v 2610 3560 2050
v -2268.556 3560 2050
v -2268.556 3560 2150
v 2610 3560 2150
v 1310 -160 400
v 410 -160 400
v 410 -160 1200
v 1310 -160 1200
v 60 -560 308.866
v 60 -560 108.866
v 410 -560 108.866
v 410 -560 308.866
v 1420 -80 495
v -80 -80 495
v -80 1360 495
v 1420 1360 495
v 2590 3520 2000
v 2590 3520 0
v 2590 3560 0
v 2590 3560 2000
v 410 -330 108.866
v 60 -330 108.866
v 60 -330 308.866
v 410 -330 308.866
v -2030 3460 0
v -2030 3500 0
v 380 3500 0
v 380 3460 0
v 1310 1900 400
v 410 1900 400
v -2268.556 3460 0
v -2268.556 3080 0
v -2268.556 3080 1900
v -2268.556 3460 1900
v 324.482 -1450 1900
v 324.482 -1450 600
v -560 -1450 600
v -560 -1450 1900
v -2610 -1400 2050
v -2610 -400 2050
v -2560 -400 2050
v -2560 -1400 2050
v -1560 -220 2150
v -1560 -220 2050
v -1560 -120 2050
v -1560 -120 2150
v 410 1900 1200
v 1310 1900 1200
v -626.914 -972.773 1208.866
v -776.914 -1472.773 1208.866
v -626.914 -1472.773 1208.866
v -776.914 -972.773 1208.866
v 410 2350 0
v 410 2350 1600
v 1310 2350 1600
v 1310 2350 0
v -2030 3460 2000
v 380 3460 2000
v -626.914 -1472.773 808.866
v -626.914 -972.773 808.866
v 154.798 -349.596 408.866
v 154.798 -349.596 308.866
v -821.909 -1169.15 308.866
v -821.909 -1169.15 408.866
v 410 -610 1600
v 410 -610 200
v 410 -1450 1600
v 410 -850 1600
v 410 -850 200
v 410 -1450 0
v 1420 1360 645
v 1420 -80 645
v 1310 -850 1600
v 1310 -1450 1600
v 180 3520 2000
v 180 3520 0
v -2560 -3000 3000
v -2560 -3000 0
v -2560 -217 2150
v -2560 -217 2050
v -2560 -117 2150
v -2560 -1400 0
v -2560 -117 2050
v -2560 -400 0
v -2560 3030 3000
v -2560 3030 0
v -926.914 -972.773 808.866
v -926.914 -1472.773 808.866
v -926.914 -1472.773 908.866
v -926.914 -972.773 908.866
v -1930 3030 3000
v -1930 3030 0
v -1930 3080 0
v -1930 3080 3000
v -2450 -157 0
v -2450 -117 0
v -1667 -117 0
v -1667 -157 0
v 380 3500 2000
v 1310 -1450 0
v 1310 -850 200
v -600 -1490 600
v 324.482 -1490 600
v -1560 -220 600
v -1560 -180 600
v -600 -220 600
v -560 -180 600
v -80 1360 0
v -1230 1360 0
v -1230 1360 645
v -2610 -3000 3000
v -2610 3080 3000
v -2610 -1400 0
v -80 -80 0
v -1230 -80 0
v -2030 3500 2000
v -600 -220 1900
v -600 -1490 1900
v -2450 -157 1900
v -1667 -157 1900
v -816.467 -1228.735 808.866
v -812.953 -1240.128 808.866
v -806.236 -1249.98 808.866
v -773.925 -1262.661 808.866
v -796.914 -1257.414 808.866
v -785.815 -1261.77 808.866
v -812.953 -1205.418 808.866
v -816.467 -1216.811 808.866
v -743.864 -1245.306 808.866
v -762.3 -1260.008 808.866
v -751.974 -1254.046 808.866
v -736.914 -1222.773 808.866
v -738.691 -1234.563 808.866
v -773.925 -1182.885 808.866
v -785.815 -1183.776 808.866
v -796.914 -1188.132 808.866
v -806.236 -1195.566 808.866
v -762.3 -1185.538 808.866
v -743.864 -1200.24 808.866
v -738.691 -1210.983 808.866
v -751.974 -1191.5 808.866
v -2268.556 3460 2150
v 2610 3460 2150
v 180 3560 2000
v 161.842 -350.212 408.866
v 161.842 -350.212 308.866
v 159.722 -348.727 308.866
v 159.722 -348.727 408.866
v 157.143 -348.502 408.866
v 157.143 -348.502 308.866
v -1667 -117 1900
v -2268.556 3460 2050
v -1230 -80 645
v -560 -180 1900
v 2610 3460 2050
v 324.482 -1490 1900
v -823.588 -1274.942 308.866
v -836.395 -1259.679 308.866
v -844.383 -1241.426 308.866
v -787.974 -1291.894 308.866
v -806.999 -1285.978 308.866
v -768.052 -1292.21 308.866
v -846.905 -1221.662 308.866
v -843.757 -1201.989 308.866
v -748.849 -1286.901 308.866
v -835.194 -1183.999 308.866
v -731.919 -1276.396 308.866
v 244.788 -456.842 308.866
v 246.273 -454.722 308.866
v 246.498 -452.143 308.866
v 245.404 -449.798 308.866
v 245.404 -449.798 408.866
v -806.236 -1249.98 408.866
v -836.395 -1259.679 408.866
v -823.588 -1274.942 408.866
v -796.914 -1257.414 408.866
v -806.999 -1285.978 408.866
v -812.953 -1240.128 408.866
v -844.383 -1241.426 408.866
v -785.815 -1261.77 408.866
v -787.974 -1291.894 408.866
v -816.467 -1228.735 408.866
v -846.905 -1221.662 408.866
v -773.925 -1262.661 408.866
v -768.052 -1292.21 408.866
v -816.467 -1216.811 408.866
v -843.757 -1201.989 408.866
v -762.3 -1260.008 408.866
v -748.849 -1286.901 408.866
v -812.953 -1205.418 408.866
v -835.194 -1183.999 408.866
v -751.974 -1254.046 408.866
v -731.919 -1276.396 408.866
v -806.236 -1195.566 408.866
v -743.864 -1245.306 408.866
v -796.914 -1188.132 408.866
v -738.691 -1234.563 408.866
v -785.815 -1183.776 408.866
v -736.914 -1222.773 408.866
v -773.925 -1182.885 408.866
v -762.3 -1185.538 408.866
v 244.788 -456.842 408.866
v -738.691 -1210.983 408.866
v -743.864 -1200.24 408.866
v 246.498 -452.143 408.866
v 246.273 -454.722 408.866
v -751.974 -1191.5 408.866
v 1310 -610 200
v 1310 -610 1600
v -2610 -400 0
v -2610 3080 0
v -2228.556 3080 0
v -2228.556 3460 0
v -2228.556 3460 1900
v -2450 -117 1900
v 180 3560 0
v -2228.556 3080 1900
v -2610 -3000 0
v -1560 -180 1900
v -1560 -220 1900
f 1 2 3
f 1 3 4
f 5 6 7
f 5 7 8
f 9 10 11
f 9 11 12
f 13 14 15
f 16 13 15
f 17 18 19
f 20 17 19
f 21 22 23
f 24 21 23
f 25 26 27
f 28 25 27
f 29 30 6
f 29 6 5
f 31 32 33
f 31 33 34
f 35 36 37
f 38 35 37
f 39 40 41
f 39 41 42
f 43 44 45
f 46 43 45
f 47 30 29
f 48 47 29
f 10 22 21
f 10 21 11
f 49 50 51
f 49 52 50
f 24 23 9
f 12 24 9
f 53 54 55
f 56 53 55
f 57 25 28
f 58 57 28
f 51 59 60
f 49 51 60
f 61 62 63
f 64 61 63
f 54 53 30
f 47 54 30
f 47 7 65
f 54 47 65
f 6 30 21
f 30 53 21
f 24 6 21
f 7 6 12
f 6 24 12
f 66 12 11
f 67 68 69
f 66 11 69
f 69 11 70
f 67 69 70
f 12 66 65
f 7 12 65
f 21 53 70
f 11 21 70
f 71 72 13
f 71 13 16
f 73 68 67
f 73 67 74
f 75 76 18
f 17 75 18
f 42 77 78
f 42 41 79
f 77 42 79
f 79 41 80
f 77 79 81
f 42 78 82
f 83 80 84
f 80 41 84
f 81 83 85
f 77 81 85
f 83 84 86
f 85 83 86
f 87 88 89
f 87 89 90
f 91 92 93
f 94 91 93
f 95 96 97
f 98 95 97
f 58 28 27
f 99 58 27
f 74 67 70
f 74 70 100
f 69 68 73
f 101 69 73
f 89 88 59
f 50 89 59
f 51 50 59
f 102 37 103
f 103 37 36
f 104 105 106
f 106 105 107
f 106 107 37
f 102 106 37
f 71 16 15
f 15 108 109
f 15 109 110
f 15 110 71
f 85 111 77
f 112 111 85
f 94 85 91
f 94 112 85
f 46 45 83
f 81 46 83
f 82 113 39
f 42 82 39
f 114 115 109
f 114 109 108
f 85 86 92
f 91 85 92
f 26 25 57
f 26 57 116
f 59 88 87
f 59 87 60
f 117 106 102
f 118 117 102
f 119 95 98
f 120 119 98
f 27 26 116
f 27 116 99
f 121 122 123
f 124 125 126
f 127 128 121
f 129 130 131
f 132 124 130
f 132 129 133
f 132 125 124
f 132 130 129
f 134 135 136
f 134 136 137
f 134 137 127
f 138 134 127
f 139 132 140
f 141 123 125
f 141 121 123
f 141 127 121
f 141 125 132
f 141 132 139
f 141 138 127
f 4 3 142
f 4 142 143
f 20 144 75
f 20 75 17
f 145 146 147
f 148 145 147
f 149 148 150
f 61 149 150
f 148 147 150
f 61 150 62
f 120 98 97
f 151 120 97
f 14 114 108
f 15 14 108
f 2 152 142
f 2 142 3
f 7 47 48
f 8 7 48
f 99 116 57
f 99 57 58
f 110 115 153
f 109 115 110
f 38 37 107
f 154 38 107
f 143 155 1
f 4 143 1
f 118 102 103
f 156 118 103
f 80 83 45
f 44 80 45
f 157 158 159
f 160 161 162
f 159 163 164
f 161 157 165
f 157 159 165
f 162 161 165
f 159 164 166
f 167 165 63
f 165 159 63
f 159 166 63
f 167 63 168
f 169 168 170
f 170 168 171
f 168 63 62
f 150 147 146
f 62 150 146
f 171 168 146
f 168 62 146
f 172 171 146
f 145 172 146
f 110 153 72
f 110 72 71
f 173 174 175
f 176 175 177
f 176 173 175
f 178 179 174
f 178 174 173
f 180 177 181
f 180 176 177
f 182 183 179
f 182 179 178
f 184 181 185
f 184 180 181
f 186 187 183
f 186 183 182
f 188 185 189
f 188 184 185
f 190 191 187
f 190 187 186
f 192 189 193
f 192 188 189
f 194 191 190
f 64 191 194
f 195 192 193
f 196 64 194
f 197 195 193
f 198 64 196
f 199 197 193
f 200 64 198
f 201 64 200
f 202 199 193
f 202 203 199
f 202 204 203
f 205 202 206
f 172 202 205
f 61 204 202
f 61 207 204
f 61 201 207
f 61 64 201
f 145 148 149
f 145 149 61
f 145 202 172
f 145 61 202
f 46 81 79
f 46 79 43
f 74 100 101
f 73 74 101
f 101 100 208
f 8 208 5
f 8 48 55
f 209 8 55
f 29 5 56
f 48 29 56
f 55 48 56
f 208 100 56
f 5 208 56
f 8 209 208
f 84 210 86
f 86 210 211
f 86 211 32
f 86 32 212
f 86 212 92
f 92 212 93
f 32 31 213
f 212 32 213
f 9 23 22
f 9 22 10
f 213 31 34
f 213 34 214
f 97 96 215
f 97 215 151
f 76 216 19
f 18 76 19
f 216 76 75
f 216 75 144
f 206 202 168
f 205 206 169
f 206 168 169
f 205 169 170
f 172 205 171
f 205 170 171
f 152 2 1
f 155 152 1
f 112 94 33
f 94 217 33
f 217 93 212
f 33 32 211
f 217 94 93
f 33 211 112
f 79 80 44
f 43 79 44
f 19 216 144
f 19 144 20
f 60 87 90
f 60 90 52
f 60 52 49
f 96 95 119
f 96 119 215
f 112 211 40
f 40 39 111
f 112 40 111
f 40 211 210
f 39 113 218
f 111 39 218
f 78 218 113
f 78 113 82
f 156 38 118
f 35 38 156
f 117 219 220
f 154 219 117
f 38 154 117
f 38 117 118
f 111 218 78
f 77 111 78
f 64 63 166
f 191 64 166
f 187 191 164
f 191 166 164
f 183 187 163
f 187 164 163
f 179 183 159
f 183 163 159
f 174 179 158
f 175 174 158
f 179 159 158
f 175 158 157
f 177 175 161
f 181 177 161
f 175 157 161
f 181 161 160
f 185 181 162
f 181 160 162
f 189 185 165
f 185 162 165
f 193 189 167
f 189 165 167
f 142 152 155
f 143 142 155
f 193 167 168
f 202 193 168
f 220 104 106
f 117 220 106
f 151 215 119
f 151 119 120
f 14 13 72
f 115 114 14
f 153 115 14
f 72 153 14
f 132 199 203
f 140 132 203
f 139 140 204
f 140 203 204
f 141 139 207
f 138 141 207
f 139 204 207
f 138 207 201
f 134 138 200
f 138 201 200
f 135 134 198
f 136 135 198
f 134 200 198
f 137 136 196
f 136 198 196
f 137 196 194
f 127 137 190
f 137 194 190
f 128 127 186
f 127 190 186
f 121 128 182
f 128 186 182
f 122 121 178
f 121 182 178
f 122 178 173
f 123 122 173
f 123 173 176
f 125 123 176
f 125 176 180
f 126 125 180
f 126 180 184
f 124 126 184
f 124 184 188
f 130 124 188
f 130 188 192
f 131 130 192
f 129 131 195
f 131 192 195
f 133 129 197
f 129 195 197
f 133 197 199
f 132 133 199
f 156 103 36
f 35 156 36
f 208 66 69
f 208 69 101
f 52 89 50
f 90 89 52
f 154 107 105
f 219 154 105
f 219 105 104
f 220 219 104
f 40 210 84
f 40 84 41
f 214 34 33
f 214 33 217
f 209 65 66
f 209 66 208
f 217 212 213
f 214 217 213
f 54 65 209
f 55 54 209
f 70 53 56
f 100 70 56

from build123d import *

# Parameters (mm, degrees)
F1_DEPTH  = 3000
F0_W      = 1150
F0_H      = 1440
F2_DEPTH  = 645
F0_W_2    = 900
F0_H_2    = 450
F0_W_3    = 660
F0_H_3    = 1290
F3_DEPTH  = 400
F4_DEPTH  = 1600
F5_W      = 900
F5_H      = 2960
F5_H_2    = 240
F5_H_3    = 600
F6_DEPTH  = 400
F7_W      = 1440
F7_H      = 150
F8_DEPTH  = 1500
F9_DEPTH  = 1400
F10_W     = 1000
F10_H     = 2050
F11_DEPTH = 50
F12_W     = 230
F12_H     = 200
F13_DEPTH = 350
F15_DEPTH = 100
F16_R     = 40
F17_DEPTH = 400
F18_W     = 300
F18_H     = 500
F19_DEPTH = 400
F20_SIZE2 = 300
F20_SIZE  = 150
F23_DEPTH = 1300
F24_W     = 2410
F24_H     = 40
F26_DEPTH = 2000
F29_DEPTH = 100
F28_W     = 4878.5563564301
F28_H     = 100
F24_W_2   = 40
F24_H_2   = 380
F30_DEPTH = 1900
F24_W_3   = 783


# Not quite as in the source:
# - the program builds the solid bodies; features that only make, move or delete a surface that nothing else refers to are left out


with BuildPart() as f1:
    # F0 (on Top) → F1 (new body)
    with BuildSketch(Plane.XY):
        Polygon((-2610, -3000), (-2560, -3000), (-2560, 3030), (-1930, 3030), (-1930, 3080), (-2610, 3080), (-2610, 3030), align=None)
    extrude(amount=F1_DEPTH)

    # F10 (on face) → F11 (cut, through all)
    with BuildSketch(Plane(origin=(-2610, 0, 0), x_dir=(0, -1, 0), z_dir=(-1, 0, 0))):
        with Locations((900, 1025)):
            Rectangle(F10_W, F10_H)
    extrude(amount=-F11_DEPTH, mode=Mode.SUBTRACT)

    # F28 (on offset) → F29 (join)
    with BuildSketch(Plane.XY.offset(2050)):
        Polygon((-1560, -220), (-1560, -120), (-2560, -117), (-2560, -217), align=None)
    extrude(amount=F29_DEPTH)

    # F24 (on Top) → F30 (join)
    with BuildSketch(Plane.XY):
        with Locations((-2248.5563564301, 3270)):
            Rectangle(F24_W_2, F24_H_2)
    extrude(amount=F30_DEPTH)


with BuildPart() as f2:
    # F0 (on Top) → F2 (new body)
    with BuildSketch(Plane.XY):
        with Locations((-655, 640)):
            Rectangle(F0_W, F0_H)
    extrude(amount=F2_DEPTH)

    # F7 (on face) → F8 (join)
    with BuildSketch(Plane.YZ.offset(-80)):
        with Locations((640, 570)):
            Rectangle(F7_W, F7_H)
    extrude(amount=F8_DEPTH)


with BuildPart() as f3:
    # F0 (on Top) → F3 (new body)
    with BuildSketch(Plane.XY):
        with Locations((860, 2125)):
            Rectangle(F0_W_2, F0_H_2)
        Polygon((1070, -80), (410, -80), (410, -160), (1310, -160), (1310, 1900), (410, 1900), (410, 1360), (1070, 1360), align=None)
        with Locations((740, 640)):
            Rectangle(F0_W_3, F0_H)
        with Locations((860, -805)):
            Rectangle(F0_W_2, F0_H_3)
    extrude(amount=F3_DEPTH)

    # F0 (on Top) → F4 (join)
    with BuildSketch(Plane.XY):
        with Locations((860, 2125)):
            Rectangle(F0_W_2, F0_H_2)
        with Locations((860, -805)):
            Rectangle(F0_W_2, F0_H_3)
    extrude(amount=F4_DEPTH)

    # F5 (on face) → F6 (join)
    with BuildSketch(Plane.XY.offset(1600)):
        with Locations((860, 870)):
            Rectangle(F5_W, F5_H)
        with Locations((860, -730)):
            Rectangle(F5_W, F5_H_2)
        with Locations((860, -1150)):
            Rectangle(F5_W, F5_H_3)
    extrude(amount=-F6_DEPTH)

    # F5 (on face) → F9 (cut)
    with BuildSketch(Plane.XY.offset(1600)):
        with Locations((860, -730)):
            Rectangle(F5_W, F5_H_2)
    extrude(amount=-F9_DEPTH, mode=Mode.SUBTRACT)

    # F12 (on face) → F13 (join)
    with BuildSketch(Plane(origin=(410, 0, 0), x_dir=(0, -1, 0), z_dir=(-1, 0, 0))):
        with Locations((445, 208.8655143976)):
            Rectangle(F12_W, F12_H)
    extrude(amount=F13_DEPTH)


with BuildPart() as f15:
    # F14 (on face) → F15 (new body)
    with BuildSketch(Plane.XY.offset(308.8655143976)):
        with BuildLine():
            Line((245.404305648, -449.7977561247), (161.8419163887, -350.2119785192))
            ThreePointArc((161.8419163887, -350.2119785192), (158.4474728868, -348.4449430772), (154.7977561247, -349.595694352))
            Line((154.7977561247, -349.595694352), (-821.908908852, -1169.1498967024))
            ThreePointArc((-821.908908852, -1169.1498967024), (-830.5368871923, -1267.7681403988), (-731.9186434959, -1276.396118739))
            Line((-731.9186434959, -1276.396118739), (244.7880214808, -456.8419163887))
            ThreePointArc((244.7880214808, -456.8419163887), (246.5550569228, -453.4474728868), (245.404305648, -449.7977561247))
        make_face()
    extrude(amount=F15_DEPTH)

    # F16 (on face) → F17 (join)
    with BuildSketch(Plane.XY.offset(408.8655143976)):
        with Locations((-776.913776174, -1222.7730077207)):
            Circle(F16_R)
    extrude(amount=F17_DEPTH)


with BuildPart() as f19:
    # F18 (on face) → F19 (new body)
    with BuildSketch(Plane.XY.offset(808.8655143976)):
        with Locations((-776.913776174, -1222.7730077207)):
            Rectangle(F18_W, F18_H)
    extrude(amount=F19_DEPTH)

    # F20
    f20_edges = [f19.edges().sort_by_distance(p)[0] for p in [
        (-926.913776, -1222.773008, 1208.865514),
    ]]
    f20_side = f19.faces().sort_by_distance((-776.913776, -1222.773008, 1208.865514))[0]
    chamfer(f20_edges, length=F20_SIZE, length2=F20_SIZE2, reference=f20_side)


with BuildPart() as f23:
    # F22 (on offset) → F23 (new body)
    with BuildSketch(Plane.XY.offset(600)):
        Polygon((324.4820666313, -1490), (324.4820666313, -1450), (-560, -1450), (-560, -180), (-1560, -180), (-1560, -220), (-600, -220), (-600, -1490), align=None)
    extrude(amount=F23_DEPTH)


with BuildPart() as f26:
    # F24 (on Top) → F26 (new body)
    with BuildSketch(Plane.XY):
        with Locations((-825, 3480)):
            Rectangle(F24_W, F24_H)
    extrude(amount=F26_DEPTH)


with BuildPart() as f26b:
    # F24 (on Top) → F26, piece 2 (new body)
    with BuildSketch(Plane.XY):
        with Locations((1385, 3540)):
            Rectangle(F24_W, F24_H)
    extrude(amount=F26_DEPTH)


with BuildPart() as f29:
    # F28 (on offset) → F29, piece 2 (new body)
    with BuildSketch(Plane.XY.offset(2050)):
        with Locations((170.721821785, 3510)):
            Rectangle(F28_W, F28_H)
    extrude(amount=F29_DEPTH)


with BuildPart() as f30:
    # F24 (on Top) → F30, piece 2 (new body)
    with BuildSketch(Plane.XY):
        with Locations((-2058.5, -137)):
            Rectangle(F24_W_3, F24_H)
    extrude(amount=F30_DEPTH)


solid = Compound([f1.part, f2.part, f3.part, f15.part, f19.part, f23.part, f26.part, f26b.part, f29.part, f30.part])
